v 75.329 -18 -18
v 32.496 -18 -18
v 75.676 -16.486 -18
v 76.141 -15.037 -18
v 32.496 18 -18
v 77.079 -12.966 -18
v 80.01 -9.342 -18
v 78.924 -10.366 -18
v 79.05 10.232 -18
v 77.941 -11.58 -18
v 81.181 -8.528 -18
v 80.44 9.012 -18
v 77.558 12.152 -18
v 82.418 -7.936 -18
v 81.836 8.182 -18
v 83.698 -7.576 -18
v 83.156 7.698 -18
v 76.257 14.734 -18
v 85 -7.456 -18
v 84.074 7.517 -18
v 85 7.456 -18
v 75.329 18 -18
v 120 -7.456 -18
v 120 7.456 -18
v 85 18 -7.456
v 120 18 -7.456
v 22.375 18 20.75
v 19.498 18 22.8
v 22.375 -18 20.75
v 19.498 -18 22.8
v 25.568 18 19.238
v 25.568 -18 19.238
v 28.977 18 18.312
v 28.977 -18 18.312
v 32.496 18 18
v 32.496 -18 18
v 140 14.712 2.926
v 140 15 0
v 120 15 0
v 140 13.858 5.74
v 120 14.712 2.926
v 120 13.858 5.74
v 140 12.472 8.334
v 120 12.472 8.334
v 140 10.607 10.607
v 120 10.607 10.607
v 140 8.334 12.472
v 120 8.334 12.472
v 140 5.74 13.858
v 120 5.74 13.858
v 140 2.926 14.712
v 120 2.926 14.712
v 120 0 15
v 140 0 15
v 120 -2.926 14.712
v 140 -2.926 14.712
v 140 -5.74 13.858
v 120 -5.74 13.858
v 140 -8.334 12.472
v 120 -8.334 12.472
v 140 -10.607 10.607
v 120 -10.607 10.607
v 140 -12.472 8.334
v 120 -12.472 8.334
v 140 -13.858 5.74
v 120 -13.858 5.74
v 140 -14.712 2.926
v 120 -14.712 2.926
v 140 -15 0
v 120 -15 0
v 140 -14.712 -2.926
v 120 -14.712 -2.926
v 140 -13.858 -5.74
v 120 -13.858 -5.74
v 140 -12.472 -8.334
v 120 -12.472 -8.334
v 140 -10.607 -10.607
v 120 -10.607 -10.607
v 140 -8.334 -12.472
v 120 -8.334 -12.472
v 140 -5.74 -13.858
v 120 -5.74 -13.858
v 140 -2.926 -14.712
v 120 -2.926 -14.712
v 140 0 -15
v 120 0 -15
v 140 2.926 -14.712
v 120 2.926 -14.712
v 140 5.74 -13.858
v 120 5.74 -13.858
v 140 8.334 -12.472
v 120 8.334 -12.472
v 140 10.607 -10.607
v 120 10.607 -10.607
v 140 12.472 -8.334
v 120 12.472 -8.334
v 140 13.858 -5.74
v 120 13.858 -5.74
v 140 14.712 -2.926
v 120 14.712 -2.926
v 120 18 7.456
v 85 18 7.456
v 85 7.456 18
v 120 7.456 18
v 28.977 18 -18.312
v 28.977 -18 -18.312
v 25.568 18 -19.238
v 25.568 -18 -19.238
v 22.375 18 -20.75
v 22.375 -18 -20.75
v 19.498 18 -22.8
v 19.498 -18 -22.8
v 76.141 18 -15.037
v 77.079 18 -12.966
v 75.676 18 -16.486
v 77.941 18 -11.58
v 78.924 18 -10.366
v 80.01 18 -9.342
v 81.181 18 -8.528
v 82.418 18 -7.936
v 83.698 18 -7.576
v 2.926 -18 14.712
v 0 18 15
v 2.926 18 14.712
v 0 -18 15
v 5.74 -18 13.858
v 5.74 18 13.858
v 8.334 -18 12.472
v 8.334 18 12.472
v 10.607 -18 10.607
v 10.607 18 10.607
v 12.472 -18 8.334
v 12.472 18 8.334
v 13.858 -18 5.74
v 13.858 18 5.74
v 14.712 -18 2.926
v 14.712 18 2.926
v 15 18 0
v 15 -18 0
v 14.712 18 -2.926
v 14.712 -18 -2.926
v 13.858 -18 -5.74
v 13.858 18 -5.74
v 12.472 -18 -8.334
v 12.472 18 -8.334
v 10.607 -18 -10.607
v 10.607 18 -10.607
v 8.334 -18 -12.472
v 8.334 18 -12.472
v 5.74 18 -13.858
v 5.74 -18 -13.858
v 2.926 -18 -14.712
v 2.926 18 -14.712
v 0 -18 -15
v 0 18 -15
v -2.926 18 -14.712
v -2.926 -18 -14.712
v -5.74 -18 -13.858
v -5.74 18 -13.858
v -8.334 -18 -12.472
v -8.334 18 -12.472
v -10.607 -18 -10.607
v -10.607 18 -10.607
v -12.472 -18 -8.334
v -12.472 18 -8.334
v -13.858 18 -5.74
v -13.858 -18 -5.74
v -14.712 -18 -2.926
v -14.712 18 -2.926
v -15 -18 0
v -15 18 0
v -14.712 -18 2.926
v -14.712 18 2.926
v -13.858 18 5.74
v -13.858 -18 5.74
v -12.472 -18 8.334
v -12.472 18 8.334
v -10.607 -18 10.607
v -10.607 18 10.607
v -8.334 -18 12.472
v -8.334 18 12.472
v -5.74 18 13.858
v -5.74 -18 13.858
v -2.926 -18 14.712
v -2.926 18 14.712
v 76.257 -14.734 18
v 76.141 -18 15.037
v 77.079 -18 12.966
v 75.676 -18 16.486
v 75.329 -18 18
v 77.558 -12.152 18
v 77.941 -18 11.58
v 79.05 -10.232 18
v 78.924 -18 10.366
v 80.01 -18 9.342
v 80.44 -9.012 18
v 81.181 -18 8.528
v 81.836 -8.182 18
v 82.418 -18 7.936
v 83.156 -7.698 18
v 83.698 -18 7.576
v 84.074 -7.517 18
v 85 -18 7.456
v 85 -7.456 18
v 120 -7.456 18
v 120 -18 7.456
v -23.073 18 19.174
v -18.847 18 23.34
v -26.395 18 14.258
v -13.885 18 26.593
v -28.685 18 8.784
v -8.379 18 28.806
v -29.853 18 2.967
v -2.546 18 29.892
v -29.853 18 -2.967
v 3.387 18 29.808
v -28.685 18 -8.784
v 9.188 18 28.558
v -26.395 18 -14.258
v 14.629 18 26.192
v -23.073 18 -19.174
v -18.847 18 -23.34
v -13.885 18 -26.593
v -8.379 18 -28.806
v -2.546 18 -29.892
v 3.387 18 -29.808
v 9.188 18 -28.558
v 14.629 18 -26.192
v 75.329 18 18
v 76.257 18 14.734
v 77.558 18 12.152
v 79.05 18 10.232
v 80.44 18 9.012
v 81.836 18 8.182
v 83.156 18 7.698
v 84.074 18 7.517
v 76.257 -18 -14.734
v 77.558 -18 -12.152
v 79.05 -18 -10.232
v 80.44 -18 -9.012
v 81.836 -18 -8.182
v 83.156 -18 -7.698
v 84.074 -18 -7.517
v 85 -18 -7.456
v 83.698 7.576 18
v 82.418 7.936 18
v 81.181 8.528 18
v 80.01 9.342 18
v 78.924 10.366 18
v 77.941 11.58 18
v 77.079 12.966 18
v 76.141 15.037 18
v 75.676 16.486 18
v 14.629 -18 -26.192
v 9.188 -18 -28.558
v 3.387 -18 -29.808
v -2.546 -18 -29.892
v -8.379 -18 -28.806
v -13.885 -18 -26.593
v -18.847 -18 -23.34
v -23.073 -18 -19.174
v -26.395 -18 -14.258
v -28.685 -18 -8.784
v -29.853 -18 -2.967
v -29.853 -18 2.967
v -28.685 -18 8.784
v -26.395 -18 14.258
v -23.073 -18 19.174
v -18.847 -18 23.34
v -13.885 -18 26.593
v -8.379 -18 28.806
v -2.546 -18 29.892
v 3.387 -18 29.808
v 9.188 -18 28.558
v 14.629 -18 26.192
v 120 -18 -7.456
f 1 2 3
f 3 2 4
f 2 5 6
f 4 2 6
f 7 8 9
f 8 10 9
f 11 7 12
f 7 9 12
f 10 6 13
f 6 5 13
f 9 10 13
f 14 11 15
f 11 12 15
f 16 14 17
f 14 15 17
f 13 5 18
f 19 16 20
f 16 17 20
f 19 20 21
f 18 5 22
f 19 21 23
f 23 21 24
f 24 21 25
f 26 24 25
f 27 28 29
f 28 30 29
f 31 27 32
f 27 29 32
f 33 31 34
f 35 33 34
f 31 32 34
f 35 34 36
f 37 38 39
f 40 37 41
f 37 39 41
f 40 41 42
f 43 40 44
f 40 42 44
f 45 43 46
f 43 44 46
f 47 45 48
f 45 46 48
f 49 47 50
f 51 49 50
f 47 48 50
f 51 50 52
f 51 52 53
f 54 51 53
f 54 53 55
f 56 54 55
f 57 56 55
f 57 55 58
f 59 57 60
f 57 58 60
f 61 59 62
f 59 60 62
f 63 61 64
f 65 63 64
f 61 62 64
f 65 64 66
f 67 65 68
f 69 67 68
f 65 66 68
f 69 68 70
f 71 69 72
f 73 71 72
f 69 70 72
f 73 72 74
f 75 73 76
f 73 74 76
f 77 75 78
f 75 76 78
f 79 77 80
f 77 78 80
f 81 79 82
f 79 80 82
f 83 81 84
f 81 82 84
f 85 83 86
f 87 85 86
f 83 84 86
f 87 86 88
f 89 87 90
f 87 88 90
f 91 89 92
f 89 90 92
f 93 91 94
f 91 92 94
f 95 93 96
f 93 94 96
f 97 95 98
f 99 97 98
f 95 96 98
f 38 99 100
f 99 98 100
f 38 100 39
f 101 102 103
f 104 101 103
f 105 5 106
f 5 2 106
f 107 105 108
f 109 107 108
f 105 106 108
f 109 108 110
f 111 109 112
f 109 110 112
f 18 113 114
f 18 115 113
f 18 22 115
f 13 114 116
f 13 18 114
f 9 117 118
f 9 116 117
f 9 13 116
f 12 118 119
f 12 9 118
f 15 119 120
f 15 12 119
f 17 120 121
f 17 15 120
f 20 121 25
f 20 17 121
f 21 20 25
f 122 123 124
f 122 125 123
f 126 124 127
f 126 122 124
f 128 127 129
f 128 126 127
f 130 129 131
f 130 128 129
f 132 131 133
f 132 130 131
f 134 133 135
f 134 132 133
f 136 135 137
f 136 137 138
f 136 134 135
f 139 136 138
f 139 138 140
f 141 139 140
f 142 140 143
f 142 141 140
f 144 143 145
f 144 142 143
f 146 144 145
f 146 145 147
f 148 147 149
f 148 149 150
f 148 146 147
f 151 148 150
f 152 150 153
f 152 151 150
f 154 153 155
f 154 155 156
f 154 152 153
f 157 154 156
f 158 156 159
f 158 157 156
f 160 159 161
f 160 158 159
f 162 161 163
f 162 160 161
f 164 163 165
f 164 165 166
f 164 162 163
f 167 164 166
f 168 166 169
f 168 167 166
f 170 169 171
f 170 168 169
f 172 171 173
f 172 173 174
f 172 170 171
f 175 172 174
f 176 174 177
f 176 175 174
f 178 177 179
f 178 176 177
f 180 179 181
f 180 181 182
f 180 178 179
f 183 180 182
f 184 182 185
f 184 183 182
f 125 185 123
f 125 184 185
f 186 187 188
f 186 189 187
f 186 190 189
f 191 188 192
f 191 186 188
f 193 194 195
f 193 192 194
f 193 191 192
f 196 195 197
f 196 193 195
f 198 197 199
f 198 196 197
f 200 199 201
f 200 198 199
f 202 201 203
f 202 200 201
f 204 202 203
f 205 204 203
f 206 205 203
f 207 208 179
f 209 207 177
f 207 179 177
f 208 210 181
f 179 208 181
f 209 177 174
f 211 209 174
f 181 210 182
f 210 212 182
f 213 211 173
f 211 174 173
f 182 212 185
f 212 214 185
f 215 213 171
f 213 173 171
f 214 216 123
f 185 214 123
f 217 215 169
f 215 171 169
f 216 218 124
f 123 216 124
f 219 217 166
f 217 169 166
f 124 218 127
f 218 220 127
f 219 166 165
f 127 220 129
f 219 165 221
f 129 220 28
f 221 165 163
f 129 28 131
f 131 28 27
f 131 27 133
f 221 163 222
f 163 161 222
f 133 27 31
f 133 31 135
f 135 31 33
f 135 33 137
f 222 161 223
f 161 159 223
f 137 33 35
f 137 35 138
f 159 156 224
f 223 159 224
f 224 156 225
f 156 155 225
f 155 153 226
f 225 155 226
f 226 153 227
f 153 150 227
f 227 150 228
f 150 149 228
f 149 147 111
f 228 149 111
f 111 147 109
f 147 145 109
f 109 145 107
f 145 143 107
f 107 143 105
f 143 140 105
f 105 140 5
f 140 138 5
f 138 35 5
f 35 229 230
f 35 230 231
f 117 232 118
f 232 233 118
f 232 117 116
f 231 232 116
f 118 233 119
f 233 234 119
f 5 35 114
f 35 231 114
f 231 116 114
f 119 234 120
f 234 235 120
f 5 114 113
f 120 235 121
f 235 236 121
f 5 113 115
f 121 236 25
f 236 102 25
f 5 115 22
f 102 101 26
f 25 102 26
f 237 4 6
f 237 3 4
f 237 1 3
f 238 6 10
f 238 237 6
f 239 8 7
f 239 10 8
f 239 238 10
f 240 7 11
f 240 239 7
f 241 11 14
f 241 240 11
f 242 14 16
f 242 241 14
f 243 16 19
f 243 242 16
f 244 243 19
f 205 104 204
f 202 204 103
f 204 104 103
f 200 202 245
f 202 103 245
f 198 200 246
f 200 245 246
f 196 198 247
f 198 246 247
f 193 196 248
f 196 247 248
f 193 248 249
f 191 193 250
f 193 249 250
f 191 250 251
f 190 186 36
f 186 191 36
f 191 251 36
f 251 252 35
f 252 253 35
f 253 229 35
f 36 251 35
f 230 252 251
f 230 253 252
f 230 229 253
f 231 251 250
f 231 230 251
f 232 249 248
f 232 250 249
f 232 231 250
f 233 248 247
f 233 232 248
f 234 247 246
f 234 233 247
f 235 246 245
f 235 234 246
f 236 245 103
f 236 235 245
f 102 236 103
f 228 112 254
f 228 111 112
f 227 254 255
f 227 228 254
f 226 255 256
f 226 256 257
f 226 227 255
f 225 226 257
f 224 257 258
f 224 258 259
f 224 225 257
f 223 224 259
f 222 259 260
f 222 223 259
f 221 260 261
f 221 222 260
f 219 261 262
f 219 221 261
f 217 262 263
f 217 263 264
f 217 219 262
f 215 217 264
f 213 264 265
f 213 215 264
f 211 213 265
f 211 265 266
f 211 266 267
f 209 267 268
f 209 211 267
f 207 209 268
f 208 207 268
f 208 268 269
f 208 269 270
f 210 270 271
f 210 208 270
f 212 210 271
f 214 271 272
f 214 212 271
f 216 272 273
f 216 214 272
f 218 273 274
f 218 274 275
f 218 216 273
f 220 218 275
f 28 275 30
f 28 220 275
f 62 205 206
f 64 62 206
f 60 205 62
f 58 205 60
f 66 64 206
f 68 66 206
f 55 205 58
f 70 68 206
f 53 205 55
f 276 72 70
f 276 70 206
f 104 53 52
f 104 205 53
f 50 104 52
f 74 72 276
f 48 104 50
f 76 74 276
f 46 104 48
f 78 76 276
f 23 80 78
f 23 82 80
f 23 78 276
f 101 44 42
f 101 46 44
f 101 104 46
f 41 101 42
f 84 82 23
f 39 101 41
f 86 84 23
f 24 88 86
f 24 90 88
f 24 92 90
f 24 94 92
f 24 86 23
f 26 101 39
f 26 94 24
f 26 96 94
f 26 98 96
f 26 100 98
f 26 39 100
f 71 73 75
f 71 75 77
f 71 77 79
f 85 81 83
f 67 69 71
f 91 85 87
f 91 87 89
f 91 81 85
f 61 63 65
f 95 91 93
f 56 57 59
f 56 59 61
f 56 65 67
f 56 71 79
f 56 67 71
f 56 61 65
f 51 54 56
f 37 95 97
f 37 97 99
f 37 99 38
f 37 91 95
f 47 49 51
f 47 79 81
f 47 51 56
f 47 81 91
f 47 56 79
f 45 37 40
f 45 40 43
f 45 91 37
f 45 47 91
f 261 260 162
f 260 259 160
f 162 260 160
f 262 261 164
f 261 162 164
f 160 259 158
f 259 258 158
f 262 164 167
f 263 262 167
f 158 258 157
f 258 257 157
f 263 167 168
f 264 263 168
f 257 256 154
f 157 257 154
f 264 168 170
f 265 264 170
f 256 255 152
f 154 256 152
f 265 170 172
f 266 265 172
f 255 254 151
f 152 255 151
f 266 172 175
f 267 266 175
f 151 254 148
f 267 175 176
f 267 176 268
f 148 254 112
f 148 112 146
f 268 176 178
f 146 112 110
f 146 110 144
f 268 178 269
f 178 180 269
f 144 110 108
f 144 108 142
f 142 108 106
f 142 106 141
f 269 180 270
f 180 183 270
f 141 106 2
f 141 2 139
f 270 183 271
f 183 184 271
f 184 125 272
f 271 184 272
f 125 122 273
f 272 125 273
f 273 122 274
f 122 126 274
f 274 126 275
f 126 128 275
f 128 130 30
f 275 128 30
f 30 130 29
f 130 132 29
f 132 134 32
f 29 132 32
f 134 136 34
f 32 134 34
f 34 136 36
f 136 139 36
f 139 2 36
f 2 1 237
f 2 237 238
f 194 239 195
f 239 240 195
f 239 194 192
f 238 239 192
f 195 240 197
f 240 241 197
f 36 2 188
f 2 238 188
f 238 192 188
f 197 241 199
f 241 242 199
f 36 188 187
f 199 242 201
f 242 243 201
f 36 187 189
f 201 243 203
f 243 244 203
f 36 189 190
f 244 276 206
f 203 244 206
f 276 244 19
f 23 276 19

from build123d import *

# Parameters (mm, degrees)
CROQUIS1_R              = 15
SALIENTE_EXTRUIR2_DEPTH = 18
SALIENTE_EXTRUIR3_DEPTH = 45
REDONDEO1_R             = 10
REDONDEO2_R             = 20
CROQUIS3_R              = 15
SALIENTE_EXTRUIR4_DEPTH = 20


with BuildPart() as part:
    # Croquis1 → Saliente-Extruir2 (new, symmetric)
    with BuildSketch(Plane(origin=(0, 0, 0), x_dir=(1, 0, 0), z_dir=(0, 1, 0))):
        with BuildLine():
            Line((24, -18), (75, -18))
            Line((75, -18), (75, 18))
            Line((75, 18), (24, 18))
            ThreePointArc((24, 18), (-30, 0), (24, -18))
        make_face()
        with Locations(Location((0, 0, 0), (0, 0, 270))):
            Circle(CROQUIS1_R, mode=Mode.SUBTRACT)
    extrude(amount=SALIENTE_EXTRUIR2_DEPTH, both=True)

    # Croquis2 → Saliente-Extruir3 (add)
    with BuildSketch(Plane(origin=(75, 0, 0), x_dir=(0, 0, -1), z_dir=(1, 0, 0))):
        Polygon((-18, -7.455844123), (-7.455844123, -18), (7.455844123, -18), (18, -7.455844123), (18, 7.455844123), (7.455844123, 18), (-7.455844123, 18), (-18, 7.455844123), align=None)
    extrude(amount=SALIENTE_EXTRUIR3_DEPTH)

    # Redondeo1
    # the kernel refuses this fillet: 10 mm, written as the material it adds along each edge
    with BuildSketch(Plane(origin=(75, 10.221825407, 35.67766953), x_dir=(-1.4210854715202005e-15, -0.7071067811865512, 0.7071067811865439), z_dir=(0, -0.7071067811865439, -0.7071067811865512))) as redondeo1_piece_1_section:
        with BuildLine():
            CenterArc((REDONDEO1_R, -REDONDEO1_R), REDONDEO1_R, 90, 90)
            Line((0, -REDONDEO1_R), (0, 0))
            Line((0, 0), (REDONDEO1_R, 0))
        make_face()
    redondeo1_piece_1 = extrude(amount=64.911688245, mode=Mode.PRIVATE)
    redondeo1_piece_1 = split(redondeo1_piece_1, bisect_by=Plane(origin=(77.775136413, -18, 13.729156697), z_dir=(0, 1, 0)), keep=Keep.TOP, mode=Mode.PRIVATE)
    redondeo1_piece_1 = split(redondeo1_piece_1, bisect_by=Plane(origin=(77.775136413, -13.729156697, 18), z_dir=(0, 0, -1)), keep=Keep.TOP, mode=Mode.PRIVATE)
    add(redondeo1_piece_1)
    with BuildSketch(Plane(origin=(75, -35.67766953, 10.221825407), x_dir=(0, -0.707106781186544, -0.7071067811865511), z_dir=(0, 0.7071067811865511, -0.7071067811865441))) as redondeo1_piece_2_section:
        with BuildLine():
            CenterArc((REDONDEO1_R, -REDONDEO1_R), REDONDEO1_R, 90, 90)
            Line((0, -REDONDEO1_R), (0, 0))
            Line((0, 0), (REDONDEO1_R, 0))
        make_face()
    redondeo1_piece_2 = extrude(amount=64.911688245, mode=Mode.PRIVATE)
    redondeo1_piece_2 = split(redondeo1_piece_2, bisect_by=Plane(origin=(77.775136413, -18, -13.729156697), z_dir=(0, 1, 0)), keep=Keep.TOP, mode=Mode.PRIVATE)
    redondeo1_piece_2 = split(redondeo1_piece_2, bisect_by=Plane(origin=(77.775136413, -13.729156697, -18), z_dir=(0, 0, 1)), keep=Keep.TOP, mode=Mode.PRIVATE)
    add(redondeo1_piece_2)
    with BuildSketch(Plane(origin=(75, -10.221825407, -35.67766953), x_dir=(1.421085471520201e-15, 0.7071067811865511, -0.7071067811865439), z_dir=(0, 0.7071067811865439, 0.7071067811865511))) as redondeo1_piece_3_section:
        with BuildLine():
            CenterArc((REDONDEO1_R, -REDONDEO1_R), REDONDEO1_R, 90, 90)
            Line((0, -REDONDEO1_R), (0, 0))
            Line((0, 0), (REDONDEO1_R, 0))
        make_face()
    redondeo1_piece_3 = extrude(amount=64.911688245, mode=Mode.PRIVATE)
    redondeo1_piece_3 = split(redondeo1_piece_3, bisect_by=Plane(origin=(77.775136413, 18, -13.729156697), z_dir=(0, -1, 0)), keep=Keep.TOP, mode=Mode.PRIVATE)
    redondeo1_piece_3 = split(redondeo1_piece_3, bisect_by=Plane(origin=(77.775136413, 13.729156697, -18), z_dir=(0, 0, 1)), keep=Keep.TOP, mode=Mode.PRIVATE)
    add(redondeo1_piece_3)
    with BuildSketch(Plane(origin=(75, 35.67766953, -10.221825407), x_dir=(0, 0.7071067811865458, 0.7071067811865493), z_dir=(0, -0.7071067811865493, 0.7071067811865458))) as redondeo1_piece_4_section:
        with BuildLine():
            CenterArc((REDONDEO1_R, -REDONDEO1_R), REDONDEO1_R, 90, 90)
            Line((0, -REDONDEO1_R), (0, 0))
            Line((0, 0), (REDONDEO1_R, 0))
        make_face()
    redondeo1_piece_4 = extrude(amount=64.911688245, mode=Mode.PRIVATE)
    redondeo1_piece_4 = split(redondeo1_piece_4, bisect_by=Plane(origin=(77.775136413, 13.729156697, 18), z_dir=(0, 0, -1)), keep=Keep.TOP, mode=Mode.PRIVATE)
    redondeo1_piece_4 = split(redondeo1_piece_4, bisect_by=Plane(origin=(77.775136413, 18, 13.729156697), z_dir=(0, -1, 0)), keep=Keep.TOP, mode=Mode.PRIVATE)
    add(redondeo1_piece_4)

    # Redondeo2
    redondeo2_edges = [part.edges().sort_by_distance(p)[0] for p in [
        (24, 0, 18),
        (24, 0, -18),
    ]]
    fillet(redondeo2_edges, radius=REDONDEO2_R)

    # Croquis3 → Saliente-Extruir4 (add)
    with BuildSketch(Plane(origin=(120, 0, 0), x_dir=(0, 0, -1), z_dir=(1, 0, 0))):
        with Locations(Location((0, 0, 0), (0, 0, 90))):
            Circle(CROQUIS3_R)
    extrude(amount=SALIENTE_EXTRUIR4_DEPTH)


solid = part.part
